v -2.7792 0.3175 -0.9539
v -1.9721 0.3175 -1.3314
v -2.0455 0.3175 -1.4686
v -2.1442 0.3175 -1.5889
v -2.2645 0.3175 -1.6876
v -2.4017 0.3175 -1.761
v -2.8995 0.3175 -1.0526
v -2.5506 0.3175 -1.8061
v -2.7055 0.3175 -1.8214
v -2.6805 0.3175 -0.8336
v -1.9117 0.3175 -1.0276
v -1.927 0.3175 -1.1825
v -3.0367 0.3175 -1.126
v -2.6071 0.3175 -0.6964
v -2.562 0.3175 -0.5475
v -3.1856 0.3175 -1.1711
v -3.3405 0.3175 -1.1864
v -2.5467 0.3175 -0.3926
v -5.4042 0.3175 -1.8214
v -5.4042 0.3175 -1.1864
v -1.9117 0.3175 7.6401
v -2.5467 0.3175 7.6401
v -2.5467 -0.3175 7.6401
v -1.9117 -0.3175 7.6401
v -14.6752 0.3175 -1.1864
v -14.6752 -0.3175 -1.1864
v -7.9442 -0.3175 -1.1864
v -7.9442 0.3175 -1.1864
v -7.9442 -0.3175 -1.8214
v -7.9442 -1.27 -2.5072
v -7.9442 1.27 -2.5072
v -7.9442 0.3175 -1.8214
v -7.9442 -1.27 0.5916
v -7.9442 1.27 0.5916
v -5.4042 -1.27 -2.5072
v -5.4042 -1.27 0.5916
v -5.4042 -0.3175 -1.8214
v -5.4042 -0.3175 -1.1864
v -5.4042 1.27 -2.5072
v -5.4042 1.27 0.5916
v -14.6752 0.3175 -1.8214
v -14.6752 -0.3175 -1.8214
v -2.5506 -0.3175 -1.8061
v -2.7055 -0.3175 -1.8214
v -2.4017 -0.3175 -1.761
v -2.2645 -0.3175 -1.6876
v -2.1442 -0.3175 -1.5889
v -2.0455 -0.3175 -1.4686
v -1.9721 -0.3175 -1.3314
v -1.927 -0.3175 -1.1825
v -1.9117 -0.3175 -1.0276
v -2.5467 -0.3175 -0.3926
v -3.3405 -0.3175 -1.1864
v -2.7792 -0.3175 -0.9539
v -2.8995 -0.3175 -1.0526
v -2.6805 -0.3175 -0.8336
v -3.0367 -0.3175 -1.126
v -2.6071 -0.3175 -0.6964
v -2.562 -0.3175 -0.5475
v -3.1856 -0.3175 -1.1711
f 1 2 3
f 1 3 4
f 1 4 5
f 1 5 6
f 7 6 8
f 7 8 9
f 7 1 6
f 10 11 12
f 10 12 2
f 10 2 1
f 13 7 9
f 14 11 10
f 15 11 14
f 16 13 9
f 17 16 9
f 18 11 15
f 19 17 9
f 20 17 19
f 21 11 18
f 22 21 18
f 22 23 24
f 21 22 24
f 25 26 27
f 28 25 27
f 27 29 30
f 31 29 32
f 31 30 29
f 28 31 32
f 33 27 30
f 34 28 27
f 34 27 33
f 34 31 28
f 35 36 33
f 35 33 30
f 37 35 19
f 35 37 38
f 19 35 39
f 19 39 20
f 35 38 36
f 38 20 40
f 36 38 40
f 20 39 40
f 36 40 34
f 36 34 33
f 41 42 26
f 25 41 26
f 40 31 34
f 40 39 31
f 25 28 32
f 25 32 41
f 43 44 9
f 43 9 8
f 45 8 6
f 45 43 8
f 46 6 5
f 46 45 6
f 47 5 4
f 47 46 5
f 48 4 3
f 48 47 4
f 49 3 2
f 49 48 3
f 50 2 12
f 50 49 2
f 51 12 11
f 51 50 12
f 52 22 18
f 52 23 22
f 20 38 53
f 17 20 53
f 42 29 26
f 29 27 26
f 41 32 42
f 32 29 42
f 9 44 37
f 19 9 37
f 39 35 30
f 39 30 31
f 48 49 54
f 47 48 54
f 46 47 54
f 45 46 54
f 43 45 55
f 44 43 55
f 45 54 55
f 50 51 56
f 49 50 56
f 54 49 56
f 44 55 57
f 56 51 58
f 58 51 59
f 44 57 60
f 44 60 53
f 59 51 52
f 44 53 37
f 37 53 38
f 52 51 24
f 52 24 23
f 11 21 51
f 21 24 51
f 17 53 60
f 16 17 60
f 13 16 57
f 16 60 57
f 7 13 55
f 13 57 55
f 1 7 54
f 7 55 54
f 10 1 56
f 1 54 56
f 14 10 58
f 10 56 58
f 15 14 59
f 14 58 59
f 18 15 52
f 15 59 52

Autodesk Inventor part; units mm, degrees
ref_plane "YZ Plane" through (0, 0, 0) normal (1, 0, 0) x (0, 1, 0)
ref_plane "XZ Plane" through (0, 0, 0) normal (0, 1, 0) x (-1, 0, 0)
sketch "Sketch1" plane through (0, 0, 0) normal (0, 1, 0) x (-1, 0, 0)
  line L0 (2.5467, 7.6401) -> (1.9117, 7.6401)
  line L1 (1.9117, 7.6401) -> (1.9117, -1.0276)
  line L2 (2.7055, -1.8214) -> (14.6752, -1.8214)
  line L3 (14.6752, -1.8214) -> (14.6752, -1.1864)
  line L4 (14.6752, -1.1864) -> (3.3405, -1.1864)
  line L5 (2.5467, 7.6401) -> (2.5467, -0.3926)
  line L6 (14.6752, -1.5039) -> (20.4389, -1.5039) construction
  line L7 (2.2292, 7.6401) -> (2.2292, 18.3973) construction
  line L8 (8.8332, 0.2741) -> (6.2932, 0.2741) construction
  line L9 (6.2932, 0.2741) -> (6.2932, -2.8247) construction
  line L10 (8.8332, -2.8247) -> (8.8332, 0.2741) construction
  arc A0 (2.5467, -0.3926) -> (3.3405, -1.1864) centre (3.3405, -0.3926) ccw
  arc A1 (1.9117, -1.0276) -> (2.7055, -1.8214) centre (2.7055, -1.0276) ccw
  line L11 (8.8332, -2.8247) -> (6.2932, -2.8247) construction
  dimension "d2" = 0.635
  dimension "d7" = 3.0988
  dimension "d9" = 1.778
  dimension "d10" = 7.366
  dimension "d11" = 4.064
  dimension "d12" = 5.842
  dimension "d13" = 0.7937
extrude "Extrusion1" add sketch "Sketch1" along normal mid plane 0.635
ref_plane "Work Plane1" through (-5.4042, -0.3175, 7.6401) normal (-1, 0, 0) x (0, 0, 1)
sketch "Sketch2" plane through (-5.4042, -0.3175, 7.6401) normal (-1, 0, 0) x (0, 0, 1)
  line L0 (-8.8265, 0) -> (-8.8265, 0.635) projected
  line L1 (-9.4615, 0.635) -> (-8.8265, 0.635) projected
  line L2 (-9.4615, 0) -> (-9.4615, 0.635) projected
  line L3 (-8.8265, 0) -> (-9.4615, 0) projected
  line L4 (-7.0485, -0.9525) -> (-10.1473, -0.9525)
  line L5 (-10.1473, -0.9525) -> (-10.1473, 1.5875)
  line L6 (-10.1473, 1.5875) -> (-7.0485, 1.5875)
  line L7 (-7.0485, 1.5875) -> (-7.0485, -0.9525)
  line L8 (-9.144, 0) -> (-9.144, -1.4837) construction
  line L9 (-11.684, 0) -> (-11.684, -1.596) construction
  line L10 (-14.224, 0) -> (-14.224, -1.596) construction
  line L11 (-9.4615, 0.3175) -> (-12.8271, 0.3175) construction
  point P0 (-7.6401, 0.3175)
  point P1 (-10.1473, 0.3175)
  dimension "d17" = 3.0988
  dimension "d18" = 1.778
  dimension "d19" = 2.54
extrude "Extrusion2" add sketch "Sketch2" along normal blind 2.54
properties part number "HeaderRight1"
